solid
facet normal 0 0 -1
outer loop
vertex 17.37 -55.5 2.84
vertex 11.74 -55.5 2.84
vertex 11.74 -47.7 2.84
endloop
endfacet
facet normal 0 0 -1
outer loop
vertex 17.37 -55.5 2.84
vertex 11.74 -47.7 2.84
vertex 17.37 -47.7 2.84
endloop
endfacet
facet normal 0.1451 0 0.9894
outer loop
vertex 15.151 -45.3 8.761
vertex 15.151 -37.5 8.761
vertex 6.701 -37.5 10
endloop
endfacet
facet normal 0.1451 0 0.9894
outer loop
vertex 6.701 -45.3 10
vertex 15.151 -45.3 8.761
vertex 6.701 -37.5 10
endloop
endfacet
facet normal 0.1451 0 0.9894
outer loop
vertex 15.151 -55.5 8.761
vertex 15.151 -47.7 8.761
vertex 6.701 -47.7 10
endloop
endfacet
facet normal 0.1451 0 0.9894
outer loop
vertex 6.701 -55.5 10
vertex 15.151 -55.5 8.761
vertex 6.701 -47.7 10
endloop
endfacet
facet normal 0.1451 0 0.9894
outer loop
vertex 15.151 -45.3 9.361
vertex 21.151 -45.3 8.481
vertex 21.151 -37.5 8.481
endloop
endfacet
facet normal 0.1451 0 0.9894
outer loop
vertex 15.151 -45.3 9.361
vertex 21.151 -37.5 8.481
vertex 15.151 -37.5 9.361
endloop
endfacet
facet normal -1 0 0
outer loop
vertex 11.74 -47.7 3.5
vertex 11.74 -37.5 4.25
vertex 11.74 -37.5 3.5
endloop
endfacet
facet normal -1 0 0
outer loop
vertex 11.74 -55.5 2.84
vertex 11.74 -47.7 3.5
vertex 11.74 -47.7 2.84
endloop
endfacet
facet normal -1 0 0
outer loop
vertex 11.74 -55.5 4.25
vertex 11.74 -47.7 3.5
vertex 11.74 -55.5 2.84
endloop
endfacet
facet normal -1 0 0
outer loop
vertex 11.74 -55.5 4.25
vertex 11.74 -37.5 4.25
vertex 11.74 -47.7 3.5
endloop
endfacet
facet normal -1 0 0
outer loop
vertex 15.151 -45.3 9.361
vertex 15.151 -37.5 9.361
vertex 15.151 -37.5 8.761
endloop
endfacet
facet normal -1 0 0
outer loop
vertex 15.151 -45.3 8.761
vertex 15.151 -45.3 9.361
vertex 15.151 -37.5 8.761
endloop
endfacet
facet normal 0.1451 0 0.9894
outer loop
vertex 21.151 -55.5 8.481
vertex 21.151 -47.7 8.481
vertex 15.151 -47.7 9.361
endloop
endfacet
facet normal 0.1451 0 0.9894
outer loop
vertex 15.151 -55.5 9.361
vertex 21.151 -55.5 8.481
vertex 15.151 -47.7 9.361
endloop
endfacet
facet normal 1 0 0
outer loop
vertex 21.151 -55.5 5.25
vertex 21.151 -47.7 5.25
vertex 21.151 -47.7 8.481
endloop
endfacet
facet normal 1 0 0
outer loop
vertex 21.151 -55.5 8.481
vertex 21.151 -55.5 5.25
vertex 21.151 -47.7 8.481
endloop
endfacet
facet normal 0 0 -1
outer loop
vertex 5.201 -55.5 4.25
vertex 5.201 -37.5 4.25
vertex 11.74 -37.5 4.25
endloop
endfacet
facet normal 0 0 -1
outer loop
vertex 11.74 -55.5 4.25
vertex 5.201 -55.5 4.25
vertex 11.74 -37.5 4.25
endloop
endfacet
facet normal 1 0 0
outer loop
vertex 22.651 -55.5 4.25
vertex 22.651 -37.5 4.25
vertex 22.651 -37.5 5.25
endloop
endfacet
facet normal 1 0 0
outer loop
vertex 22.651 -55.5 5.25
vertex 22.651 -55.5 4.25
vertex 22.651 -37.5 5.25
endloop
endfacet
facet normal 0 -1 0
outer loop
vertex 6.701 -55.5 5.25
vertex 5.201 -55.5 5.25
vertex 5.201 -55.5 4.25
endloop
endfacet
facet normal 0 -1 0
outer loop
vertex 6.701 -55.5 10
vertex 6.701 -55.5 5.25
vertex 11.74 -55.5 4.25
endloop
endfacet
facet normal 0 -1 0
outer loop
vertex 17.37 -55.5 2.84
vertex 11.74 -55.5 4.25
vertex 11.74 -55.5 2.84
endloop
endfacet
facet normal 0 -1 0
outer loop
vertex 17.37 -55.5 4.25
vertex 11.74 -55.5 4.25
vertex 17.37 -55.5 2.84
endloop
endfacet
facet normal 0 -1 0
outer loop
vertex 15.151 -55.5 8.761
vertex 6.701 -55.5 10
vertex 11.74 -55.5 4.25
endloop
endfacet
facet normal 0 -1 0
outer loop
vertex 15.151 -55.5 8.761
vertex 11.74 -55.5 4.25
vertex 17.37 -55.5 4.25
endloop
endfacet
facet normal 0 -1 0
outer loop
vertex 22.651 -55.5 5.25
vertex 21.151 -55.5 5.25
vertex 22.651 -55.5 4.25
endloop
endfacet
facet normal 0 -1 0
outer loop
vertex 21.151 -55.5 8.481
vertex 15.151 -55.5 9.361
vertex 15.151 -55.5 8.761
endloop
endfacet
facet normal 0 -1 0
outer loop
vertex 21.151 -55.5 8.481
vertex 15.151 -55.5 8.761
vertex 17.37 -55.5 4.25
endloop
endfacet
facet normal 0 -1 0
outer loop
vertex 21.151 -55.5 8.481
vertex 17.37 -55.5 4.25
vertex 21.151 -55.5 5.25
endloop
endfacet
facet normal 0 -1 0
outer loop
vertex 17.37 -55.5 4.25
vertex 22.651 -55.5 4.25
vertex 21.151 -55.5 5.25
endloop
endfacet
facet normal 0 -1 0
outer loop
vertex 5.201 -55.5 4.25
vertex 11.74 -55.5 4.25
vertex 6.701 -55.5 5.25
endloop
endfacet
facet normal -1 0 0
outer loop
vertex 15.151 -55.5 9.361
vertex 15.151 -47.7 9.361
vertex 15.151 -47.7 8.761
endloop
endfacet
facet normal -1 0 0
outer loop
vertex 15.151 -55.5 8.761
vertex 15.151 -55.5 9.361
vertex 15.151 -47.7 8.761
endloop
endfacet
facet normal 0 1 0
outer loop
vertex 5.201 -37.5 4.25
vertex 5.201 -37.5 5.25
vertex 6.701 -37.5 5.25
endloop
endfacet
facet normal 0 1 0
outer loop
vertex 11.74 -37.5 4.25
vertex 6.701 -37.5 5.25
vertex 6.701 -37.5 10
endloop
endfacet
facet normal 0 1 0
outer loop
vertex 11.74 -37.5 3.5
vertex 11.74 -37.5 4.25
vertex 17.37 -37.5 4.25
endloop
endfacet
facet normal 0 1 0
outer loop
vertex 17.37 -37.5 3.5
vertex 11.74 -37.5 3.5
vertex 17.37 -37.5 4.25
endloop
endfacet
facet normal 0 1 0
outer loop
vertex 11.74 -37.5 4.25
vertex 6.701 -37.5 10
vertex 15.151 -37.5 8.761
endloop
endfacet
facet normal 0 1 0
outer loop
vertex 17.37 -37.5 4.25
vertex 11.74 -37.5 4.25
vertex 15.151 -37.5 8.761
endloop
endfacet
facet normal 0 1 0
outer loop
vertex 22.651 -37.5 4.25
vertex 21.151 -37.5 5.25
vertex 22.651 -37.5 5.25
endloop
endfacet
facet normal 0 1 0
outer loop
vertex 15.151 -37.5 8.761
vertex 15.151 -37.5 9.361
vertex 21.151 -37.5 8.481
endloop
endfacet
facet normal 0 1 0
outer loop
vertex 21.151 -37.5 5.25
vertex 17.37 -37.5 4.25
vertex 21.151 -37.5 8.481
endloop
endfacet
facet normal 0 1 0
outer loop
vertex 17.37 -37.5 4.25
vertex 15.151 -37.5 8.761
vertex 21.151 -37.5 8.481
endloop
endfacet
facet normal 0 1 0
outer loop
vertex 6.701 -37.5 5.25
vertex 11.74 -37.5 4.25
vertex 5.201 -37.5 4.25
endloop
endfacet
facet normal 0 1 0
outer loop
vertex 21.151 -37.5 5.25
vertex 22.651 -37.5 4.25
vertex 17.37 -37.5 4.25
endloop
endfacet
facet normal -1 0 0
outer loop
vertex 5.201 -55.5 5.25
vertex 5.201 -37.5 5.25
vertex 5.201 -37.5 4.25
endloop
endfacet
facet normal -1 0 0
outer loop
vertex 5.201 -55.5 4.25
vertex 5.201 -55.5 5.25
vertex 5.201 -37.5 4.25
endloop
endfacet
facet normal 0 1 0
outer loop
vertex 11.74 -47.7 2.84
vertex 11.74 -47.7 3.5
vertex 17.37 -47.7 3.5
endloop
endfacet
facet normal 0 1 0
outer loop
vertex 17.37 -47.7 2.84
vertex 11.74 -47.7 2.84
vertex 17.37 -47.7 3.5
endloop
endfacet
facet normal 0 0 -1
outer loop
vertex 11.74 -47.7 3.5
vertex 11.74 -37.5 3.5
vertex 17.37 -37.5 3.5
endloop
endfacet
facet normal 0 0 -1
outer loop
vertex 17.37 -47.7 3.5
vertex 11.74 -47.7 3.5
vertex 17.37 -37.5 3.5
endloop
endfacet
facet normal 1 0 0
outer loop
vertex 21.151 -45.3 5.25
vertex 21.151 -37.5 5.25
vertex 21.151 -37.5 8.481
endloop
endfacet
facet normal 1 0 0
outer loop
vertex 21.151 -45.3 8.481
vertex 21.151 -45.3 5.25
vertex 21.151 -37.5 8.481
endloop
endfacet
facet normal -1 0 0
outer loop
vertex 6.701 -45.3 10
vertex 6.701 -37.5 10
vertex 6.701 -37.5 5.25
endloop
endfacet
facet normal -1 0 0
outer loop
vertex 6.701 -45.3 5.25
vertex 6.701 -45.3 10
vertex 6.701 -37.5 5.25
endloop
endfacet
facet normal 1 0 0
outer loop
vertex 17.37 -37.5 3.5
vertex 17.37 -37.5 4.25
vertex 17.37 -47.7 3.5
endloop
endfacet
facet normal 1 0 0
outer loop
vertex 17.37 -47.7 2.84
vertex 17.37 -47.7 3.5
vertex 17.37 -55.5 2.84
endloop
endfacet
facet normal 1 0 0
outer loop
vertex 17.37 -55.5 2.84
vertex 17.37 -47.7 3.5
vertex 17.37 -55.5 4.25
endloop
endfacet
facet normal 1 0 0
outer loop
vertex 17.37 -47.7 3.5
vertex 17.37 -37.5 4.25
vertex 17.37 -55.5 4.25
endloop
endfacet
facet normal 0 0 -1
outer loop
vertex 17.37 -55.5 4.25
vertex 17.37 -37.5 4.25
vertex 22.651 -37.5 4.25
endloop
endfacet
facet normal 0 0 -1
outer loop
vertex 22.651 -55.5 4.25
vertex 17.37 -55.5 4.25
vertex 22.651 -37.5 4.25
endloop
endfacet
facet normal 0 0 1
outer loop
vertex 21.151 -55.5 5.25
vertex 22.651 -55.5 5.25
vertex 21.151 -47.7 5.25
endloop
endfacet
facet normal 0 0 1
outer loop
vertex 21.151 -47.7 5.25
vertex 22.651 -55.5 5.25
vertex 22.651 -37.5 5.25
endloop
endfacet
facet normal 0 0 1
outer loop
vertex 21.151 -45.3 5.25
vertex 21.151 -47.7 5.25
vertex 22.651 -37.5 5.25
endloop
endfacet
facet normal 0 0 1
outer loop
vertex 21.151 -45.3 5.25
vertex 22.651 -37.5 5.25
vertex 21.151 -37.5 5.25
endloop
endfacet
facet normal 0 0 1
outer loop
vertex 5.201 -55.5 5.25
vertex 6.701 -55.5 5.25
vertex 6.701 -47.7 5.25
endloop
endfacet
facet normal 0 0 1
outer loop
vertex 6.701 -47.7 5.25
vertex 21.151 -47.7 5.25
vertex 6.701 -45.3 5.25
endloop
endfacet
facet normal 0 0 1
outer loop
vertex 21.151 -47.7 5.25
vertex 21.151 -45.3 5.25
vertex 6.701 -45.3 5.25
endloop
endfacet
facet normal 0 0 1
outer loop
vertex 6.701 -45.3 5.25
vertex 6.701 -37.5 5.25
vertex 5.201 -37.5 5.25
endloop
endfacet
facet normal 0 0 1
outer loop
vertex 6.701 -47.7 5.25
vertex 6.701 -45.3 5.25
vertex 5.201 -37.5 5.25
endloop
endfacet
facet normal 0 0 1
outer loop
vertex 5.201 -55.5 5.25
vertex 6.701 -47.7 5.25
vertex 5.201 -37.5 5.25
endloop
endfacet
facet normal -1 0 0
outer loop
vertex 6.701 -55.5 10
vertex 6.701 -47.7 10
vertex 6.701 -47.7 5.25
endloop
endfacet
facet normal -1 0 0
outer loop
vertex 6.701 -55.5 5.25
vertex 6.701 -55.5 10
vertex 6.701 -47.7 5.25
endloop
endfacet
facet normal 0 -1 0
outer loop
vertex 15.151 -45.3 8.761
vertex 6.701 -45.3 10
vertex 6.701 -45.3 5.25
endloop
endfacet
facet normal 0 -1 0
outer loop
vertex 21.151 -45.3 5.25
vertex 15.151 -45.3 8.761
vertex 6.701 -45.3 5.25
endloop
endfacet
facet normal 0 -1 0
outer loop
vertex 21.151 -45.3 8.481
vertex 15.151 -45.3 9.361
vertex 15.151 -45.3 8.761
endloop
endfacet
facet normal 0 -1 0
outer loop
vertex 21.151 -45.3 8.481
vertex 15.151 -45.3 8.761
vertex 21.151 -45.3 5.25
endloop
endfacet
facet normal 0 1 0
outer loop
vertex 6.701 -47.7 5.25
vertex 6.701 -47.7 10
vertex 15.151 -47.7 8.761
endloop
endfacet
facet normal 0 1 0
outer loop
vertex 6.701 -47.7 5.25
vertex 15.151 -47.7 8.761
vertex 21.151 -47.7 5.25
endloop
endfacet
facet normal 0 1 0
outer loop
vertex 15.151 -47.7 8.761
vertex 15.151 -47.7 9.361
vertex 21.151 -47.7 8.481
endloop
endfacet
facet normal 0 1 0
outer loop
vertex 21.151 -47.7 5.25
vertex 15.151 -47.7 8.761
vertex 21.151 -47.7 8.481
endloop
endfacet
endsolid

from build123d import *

# Parameters (mm, degrees)
PAD006_DEPTH    = 18
SKETCH017_W     = 17.45
SKETCH017_H     = 2.4
POCKET010_DEPTH = 6.75
SKETCH018_W     = 5.63
SKETCH018_H     = 7.8
PAD007_DEPTH    = 0.66


with BuildPart() as part:
    # Sketch016 → Pad006 (new body)
    with BuildSketch(Plane.XZ):
        Polygon((21.151384, 8.480667), (15.151384, 9.360667), (15.151384, 8.760667), (6.701384, 10), (6.701384, 5.25), (5.201384, 5.25), (5.201384, 4.25), (11.74, 4.25), (11.74, 3.5), (17.37, 3.5), (17.37, 4.25), (22.651384, 4.25), (22.651384, 5.25), (21.151384, 5.25), align=None)
    extrude(amount=PAD006_DEPTH)

    # Sketch017 → Pocket010 (cut)
    with BuildSketch(Plane.XY.offset(12)):
        with Locations((13.926384, -9)):
            Rectangle(SKETCH017_W, SKETCH017_H)
    extrude(amount=-POCKET010_DEPTH, mode=Mode.SUBTRACT)

    # Sketch018 (on Face13 of Pocket010) → Pad007 (join)
    with BuildSketch(Plane(origin=(0, 0, 3.5), x_dir=(1, 0, 0), z_dir=(0, 0, -1))):
        with Locations((14.555, 14.1)):
            Rectangle(SKETCH018_W, SKETCH018_H)
    extrude(amount=PAD007_DEPTH)


with BuildPart() as part_1:
    # Body003 placement: moved
    add(part.part.moved(Location((0, -37.5, 0))))


solid = part_1.part
